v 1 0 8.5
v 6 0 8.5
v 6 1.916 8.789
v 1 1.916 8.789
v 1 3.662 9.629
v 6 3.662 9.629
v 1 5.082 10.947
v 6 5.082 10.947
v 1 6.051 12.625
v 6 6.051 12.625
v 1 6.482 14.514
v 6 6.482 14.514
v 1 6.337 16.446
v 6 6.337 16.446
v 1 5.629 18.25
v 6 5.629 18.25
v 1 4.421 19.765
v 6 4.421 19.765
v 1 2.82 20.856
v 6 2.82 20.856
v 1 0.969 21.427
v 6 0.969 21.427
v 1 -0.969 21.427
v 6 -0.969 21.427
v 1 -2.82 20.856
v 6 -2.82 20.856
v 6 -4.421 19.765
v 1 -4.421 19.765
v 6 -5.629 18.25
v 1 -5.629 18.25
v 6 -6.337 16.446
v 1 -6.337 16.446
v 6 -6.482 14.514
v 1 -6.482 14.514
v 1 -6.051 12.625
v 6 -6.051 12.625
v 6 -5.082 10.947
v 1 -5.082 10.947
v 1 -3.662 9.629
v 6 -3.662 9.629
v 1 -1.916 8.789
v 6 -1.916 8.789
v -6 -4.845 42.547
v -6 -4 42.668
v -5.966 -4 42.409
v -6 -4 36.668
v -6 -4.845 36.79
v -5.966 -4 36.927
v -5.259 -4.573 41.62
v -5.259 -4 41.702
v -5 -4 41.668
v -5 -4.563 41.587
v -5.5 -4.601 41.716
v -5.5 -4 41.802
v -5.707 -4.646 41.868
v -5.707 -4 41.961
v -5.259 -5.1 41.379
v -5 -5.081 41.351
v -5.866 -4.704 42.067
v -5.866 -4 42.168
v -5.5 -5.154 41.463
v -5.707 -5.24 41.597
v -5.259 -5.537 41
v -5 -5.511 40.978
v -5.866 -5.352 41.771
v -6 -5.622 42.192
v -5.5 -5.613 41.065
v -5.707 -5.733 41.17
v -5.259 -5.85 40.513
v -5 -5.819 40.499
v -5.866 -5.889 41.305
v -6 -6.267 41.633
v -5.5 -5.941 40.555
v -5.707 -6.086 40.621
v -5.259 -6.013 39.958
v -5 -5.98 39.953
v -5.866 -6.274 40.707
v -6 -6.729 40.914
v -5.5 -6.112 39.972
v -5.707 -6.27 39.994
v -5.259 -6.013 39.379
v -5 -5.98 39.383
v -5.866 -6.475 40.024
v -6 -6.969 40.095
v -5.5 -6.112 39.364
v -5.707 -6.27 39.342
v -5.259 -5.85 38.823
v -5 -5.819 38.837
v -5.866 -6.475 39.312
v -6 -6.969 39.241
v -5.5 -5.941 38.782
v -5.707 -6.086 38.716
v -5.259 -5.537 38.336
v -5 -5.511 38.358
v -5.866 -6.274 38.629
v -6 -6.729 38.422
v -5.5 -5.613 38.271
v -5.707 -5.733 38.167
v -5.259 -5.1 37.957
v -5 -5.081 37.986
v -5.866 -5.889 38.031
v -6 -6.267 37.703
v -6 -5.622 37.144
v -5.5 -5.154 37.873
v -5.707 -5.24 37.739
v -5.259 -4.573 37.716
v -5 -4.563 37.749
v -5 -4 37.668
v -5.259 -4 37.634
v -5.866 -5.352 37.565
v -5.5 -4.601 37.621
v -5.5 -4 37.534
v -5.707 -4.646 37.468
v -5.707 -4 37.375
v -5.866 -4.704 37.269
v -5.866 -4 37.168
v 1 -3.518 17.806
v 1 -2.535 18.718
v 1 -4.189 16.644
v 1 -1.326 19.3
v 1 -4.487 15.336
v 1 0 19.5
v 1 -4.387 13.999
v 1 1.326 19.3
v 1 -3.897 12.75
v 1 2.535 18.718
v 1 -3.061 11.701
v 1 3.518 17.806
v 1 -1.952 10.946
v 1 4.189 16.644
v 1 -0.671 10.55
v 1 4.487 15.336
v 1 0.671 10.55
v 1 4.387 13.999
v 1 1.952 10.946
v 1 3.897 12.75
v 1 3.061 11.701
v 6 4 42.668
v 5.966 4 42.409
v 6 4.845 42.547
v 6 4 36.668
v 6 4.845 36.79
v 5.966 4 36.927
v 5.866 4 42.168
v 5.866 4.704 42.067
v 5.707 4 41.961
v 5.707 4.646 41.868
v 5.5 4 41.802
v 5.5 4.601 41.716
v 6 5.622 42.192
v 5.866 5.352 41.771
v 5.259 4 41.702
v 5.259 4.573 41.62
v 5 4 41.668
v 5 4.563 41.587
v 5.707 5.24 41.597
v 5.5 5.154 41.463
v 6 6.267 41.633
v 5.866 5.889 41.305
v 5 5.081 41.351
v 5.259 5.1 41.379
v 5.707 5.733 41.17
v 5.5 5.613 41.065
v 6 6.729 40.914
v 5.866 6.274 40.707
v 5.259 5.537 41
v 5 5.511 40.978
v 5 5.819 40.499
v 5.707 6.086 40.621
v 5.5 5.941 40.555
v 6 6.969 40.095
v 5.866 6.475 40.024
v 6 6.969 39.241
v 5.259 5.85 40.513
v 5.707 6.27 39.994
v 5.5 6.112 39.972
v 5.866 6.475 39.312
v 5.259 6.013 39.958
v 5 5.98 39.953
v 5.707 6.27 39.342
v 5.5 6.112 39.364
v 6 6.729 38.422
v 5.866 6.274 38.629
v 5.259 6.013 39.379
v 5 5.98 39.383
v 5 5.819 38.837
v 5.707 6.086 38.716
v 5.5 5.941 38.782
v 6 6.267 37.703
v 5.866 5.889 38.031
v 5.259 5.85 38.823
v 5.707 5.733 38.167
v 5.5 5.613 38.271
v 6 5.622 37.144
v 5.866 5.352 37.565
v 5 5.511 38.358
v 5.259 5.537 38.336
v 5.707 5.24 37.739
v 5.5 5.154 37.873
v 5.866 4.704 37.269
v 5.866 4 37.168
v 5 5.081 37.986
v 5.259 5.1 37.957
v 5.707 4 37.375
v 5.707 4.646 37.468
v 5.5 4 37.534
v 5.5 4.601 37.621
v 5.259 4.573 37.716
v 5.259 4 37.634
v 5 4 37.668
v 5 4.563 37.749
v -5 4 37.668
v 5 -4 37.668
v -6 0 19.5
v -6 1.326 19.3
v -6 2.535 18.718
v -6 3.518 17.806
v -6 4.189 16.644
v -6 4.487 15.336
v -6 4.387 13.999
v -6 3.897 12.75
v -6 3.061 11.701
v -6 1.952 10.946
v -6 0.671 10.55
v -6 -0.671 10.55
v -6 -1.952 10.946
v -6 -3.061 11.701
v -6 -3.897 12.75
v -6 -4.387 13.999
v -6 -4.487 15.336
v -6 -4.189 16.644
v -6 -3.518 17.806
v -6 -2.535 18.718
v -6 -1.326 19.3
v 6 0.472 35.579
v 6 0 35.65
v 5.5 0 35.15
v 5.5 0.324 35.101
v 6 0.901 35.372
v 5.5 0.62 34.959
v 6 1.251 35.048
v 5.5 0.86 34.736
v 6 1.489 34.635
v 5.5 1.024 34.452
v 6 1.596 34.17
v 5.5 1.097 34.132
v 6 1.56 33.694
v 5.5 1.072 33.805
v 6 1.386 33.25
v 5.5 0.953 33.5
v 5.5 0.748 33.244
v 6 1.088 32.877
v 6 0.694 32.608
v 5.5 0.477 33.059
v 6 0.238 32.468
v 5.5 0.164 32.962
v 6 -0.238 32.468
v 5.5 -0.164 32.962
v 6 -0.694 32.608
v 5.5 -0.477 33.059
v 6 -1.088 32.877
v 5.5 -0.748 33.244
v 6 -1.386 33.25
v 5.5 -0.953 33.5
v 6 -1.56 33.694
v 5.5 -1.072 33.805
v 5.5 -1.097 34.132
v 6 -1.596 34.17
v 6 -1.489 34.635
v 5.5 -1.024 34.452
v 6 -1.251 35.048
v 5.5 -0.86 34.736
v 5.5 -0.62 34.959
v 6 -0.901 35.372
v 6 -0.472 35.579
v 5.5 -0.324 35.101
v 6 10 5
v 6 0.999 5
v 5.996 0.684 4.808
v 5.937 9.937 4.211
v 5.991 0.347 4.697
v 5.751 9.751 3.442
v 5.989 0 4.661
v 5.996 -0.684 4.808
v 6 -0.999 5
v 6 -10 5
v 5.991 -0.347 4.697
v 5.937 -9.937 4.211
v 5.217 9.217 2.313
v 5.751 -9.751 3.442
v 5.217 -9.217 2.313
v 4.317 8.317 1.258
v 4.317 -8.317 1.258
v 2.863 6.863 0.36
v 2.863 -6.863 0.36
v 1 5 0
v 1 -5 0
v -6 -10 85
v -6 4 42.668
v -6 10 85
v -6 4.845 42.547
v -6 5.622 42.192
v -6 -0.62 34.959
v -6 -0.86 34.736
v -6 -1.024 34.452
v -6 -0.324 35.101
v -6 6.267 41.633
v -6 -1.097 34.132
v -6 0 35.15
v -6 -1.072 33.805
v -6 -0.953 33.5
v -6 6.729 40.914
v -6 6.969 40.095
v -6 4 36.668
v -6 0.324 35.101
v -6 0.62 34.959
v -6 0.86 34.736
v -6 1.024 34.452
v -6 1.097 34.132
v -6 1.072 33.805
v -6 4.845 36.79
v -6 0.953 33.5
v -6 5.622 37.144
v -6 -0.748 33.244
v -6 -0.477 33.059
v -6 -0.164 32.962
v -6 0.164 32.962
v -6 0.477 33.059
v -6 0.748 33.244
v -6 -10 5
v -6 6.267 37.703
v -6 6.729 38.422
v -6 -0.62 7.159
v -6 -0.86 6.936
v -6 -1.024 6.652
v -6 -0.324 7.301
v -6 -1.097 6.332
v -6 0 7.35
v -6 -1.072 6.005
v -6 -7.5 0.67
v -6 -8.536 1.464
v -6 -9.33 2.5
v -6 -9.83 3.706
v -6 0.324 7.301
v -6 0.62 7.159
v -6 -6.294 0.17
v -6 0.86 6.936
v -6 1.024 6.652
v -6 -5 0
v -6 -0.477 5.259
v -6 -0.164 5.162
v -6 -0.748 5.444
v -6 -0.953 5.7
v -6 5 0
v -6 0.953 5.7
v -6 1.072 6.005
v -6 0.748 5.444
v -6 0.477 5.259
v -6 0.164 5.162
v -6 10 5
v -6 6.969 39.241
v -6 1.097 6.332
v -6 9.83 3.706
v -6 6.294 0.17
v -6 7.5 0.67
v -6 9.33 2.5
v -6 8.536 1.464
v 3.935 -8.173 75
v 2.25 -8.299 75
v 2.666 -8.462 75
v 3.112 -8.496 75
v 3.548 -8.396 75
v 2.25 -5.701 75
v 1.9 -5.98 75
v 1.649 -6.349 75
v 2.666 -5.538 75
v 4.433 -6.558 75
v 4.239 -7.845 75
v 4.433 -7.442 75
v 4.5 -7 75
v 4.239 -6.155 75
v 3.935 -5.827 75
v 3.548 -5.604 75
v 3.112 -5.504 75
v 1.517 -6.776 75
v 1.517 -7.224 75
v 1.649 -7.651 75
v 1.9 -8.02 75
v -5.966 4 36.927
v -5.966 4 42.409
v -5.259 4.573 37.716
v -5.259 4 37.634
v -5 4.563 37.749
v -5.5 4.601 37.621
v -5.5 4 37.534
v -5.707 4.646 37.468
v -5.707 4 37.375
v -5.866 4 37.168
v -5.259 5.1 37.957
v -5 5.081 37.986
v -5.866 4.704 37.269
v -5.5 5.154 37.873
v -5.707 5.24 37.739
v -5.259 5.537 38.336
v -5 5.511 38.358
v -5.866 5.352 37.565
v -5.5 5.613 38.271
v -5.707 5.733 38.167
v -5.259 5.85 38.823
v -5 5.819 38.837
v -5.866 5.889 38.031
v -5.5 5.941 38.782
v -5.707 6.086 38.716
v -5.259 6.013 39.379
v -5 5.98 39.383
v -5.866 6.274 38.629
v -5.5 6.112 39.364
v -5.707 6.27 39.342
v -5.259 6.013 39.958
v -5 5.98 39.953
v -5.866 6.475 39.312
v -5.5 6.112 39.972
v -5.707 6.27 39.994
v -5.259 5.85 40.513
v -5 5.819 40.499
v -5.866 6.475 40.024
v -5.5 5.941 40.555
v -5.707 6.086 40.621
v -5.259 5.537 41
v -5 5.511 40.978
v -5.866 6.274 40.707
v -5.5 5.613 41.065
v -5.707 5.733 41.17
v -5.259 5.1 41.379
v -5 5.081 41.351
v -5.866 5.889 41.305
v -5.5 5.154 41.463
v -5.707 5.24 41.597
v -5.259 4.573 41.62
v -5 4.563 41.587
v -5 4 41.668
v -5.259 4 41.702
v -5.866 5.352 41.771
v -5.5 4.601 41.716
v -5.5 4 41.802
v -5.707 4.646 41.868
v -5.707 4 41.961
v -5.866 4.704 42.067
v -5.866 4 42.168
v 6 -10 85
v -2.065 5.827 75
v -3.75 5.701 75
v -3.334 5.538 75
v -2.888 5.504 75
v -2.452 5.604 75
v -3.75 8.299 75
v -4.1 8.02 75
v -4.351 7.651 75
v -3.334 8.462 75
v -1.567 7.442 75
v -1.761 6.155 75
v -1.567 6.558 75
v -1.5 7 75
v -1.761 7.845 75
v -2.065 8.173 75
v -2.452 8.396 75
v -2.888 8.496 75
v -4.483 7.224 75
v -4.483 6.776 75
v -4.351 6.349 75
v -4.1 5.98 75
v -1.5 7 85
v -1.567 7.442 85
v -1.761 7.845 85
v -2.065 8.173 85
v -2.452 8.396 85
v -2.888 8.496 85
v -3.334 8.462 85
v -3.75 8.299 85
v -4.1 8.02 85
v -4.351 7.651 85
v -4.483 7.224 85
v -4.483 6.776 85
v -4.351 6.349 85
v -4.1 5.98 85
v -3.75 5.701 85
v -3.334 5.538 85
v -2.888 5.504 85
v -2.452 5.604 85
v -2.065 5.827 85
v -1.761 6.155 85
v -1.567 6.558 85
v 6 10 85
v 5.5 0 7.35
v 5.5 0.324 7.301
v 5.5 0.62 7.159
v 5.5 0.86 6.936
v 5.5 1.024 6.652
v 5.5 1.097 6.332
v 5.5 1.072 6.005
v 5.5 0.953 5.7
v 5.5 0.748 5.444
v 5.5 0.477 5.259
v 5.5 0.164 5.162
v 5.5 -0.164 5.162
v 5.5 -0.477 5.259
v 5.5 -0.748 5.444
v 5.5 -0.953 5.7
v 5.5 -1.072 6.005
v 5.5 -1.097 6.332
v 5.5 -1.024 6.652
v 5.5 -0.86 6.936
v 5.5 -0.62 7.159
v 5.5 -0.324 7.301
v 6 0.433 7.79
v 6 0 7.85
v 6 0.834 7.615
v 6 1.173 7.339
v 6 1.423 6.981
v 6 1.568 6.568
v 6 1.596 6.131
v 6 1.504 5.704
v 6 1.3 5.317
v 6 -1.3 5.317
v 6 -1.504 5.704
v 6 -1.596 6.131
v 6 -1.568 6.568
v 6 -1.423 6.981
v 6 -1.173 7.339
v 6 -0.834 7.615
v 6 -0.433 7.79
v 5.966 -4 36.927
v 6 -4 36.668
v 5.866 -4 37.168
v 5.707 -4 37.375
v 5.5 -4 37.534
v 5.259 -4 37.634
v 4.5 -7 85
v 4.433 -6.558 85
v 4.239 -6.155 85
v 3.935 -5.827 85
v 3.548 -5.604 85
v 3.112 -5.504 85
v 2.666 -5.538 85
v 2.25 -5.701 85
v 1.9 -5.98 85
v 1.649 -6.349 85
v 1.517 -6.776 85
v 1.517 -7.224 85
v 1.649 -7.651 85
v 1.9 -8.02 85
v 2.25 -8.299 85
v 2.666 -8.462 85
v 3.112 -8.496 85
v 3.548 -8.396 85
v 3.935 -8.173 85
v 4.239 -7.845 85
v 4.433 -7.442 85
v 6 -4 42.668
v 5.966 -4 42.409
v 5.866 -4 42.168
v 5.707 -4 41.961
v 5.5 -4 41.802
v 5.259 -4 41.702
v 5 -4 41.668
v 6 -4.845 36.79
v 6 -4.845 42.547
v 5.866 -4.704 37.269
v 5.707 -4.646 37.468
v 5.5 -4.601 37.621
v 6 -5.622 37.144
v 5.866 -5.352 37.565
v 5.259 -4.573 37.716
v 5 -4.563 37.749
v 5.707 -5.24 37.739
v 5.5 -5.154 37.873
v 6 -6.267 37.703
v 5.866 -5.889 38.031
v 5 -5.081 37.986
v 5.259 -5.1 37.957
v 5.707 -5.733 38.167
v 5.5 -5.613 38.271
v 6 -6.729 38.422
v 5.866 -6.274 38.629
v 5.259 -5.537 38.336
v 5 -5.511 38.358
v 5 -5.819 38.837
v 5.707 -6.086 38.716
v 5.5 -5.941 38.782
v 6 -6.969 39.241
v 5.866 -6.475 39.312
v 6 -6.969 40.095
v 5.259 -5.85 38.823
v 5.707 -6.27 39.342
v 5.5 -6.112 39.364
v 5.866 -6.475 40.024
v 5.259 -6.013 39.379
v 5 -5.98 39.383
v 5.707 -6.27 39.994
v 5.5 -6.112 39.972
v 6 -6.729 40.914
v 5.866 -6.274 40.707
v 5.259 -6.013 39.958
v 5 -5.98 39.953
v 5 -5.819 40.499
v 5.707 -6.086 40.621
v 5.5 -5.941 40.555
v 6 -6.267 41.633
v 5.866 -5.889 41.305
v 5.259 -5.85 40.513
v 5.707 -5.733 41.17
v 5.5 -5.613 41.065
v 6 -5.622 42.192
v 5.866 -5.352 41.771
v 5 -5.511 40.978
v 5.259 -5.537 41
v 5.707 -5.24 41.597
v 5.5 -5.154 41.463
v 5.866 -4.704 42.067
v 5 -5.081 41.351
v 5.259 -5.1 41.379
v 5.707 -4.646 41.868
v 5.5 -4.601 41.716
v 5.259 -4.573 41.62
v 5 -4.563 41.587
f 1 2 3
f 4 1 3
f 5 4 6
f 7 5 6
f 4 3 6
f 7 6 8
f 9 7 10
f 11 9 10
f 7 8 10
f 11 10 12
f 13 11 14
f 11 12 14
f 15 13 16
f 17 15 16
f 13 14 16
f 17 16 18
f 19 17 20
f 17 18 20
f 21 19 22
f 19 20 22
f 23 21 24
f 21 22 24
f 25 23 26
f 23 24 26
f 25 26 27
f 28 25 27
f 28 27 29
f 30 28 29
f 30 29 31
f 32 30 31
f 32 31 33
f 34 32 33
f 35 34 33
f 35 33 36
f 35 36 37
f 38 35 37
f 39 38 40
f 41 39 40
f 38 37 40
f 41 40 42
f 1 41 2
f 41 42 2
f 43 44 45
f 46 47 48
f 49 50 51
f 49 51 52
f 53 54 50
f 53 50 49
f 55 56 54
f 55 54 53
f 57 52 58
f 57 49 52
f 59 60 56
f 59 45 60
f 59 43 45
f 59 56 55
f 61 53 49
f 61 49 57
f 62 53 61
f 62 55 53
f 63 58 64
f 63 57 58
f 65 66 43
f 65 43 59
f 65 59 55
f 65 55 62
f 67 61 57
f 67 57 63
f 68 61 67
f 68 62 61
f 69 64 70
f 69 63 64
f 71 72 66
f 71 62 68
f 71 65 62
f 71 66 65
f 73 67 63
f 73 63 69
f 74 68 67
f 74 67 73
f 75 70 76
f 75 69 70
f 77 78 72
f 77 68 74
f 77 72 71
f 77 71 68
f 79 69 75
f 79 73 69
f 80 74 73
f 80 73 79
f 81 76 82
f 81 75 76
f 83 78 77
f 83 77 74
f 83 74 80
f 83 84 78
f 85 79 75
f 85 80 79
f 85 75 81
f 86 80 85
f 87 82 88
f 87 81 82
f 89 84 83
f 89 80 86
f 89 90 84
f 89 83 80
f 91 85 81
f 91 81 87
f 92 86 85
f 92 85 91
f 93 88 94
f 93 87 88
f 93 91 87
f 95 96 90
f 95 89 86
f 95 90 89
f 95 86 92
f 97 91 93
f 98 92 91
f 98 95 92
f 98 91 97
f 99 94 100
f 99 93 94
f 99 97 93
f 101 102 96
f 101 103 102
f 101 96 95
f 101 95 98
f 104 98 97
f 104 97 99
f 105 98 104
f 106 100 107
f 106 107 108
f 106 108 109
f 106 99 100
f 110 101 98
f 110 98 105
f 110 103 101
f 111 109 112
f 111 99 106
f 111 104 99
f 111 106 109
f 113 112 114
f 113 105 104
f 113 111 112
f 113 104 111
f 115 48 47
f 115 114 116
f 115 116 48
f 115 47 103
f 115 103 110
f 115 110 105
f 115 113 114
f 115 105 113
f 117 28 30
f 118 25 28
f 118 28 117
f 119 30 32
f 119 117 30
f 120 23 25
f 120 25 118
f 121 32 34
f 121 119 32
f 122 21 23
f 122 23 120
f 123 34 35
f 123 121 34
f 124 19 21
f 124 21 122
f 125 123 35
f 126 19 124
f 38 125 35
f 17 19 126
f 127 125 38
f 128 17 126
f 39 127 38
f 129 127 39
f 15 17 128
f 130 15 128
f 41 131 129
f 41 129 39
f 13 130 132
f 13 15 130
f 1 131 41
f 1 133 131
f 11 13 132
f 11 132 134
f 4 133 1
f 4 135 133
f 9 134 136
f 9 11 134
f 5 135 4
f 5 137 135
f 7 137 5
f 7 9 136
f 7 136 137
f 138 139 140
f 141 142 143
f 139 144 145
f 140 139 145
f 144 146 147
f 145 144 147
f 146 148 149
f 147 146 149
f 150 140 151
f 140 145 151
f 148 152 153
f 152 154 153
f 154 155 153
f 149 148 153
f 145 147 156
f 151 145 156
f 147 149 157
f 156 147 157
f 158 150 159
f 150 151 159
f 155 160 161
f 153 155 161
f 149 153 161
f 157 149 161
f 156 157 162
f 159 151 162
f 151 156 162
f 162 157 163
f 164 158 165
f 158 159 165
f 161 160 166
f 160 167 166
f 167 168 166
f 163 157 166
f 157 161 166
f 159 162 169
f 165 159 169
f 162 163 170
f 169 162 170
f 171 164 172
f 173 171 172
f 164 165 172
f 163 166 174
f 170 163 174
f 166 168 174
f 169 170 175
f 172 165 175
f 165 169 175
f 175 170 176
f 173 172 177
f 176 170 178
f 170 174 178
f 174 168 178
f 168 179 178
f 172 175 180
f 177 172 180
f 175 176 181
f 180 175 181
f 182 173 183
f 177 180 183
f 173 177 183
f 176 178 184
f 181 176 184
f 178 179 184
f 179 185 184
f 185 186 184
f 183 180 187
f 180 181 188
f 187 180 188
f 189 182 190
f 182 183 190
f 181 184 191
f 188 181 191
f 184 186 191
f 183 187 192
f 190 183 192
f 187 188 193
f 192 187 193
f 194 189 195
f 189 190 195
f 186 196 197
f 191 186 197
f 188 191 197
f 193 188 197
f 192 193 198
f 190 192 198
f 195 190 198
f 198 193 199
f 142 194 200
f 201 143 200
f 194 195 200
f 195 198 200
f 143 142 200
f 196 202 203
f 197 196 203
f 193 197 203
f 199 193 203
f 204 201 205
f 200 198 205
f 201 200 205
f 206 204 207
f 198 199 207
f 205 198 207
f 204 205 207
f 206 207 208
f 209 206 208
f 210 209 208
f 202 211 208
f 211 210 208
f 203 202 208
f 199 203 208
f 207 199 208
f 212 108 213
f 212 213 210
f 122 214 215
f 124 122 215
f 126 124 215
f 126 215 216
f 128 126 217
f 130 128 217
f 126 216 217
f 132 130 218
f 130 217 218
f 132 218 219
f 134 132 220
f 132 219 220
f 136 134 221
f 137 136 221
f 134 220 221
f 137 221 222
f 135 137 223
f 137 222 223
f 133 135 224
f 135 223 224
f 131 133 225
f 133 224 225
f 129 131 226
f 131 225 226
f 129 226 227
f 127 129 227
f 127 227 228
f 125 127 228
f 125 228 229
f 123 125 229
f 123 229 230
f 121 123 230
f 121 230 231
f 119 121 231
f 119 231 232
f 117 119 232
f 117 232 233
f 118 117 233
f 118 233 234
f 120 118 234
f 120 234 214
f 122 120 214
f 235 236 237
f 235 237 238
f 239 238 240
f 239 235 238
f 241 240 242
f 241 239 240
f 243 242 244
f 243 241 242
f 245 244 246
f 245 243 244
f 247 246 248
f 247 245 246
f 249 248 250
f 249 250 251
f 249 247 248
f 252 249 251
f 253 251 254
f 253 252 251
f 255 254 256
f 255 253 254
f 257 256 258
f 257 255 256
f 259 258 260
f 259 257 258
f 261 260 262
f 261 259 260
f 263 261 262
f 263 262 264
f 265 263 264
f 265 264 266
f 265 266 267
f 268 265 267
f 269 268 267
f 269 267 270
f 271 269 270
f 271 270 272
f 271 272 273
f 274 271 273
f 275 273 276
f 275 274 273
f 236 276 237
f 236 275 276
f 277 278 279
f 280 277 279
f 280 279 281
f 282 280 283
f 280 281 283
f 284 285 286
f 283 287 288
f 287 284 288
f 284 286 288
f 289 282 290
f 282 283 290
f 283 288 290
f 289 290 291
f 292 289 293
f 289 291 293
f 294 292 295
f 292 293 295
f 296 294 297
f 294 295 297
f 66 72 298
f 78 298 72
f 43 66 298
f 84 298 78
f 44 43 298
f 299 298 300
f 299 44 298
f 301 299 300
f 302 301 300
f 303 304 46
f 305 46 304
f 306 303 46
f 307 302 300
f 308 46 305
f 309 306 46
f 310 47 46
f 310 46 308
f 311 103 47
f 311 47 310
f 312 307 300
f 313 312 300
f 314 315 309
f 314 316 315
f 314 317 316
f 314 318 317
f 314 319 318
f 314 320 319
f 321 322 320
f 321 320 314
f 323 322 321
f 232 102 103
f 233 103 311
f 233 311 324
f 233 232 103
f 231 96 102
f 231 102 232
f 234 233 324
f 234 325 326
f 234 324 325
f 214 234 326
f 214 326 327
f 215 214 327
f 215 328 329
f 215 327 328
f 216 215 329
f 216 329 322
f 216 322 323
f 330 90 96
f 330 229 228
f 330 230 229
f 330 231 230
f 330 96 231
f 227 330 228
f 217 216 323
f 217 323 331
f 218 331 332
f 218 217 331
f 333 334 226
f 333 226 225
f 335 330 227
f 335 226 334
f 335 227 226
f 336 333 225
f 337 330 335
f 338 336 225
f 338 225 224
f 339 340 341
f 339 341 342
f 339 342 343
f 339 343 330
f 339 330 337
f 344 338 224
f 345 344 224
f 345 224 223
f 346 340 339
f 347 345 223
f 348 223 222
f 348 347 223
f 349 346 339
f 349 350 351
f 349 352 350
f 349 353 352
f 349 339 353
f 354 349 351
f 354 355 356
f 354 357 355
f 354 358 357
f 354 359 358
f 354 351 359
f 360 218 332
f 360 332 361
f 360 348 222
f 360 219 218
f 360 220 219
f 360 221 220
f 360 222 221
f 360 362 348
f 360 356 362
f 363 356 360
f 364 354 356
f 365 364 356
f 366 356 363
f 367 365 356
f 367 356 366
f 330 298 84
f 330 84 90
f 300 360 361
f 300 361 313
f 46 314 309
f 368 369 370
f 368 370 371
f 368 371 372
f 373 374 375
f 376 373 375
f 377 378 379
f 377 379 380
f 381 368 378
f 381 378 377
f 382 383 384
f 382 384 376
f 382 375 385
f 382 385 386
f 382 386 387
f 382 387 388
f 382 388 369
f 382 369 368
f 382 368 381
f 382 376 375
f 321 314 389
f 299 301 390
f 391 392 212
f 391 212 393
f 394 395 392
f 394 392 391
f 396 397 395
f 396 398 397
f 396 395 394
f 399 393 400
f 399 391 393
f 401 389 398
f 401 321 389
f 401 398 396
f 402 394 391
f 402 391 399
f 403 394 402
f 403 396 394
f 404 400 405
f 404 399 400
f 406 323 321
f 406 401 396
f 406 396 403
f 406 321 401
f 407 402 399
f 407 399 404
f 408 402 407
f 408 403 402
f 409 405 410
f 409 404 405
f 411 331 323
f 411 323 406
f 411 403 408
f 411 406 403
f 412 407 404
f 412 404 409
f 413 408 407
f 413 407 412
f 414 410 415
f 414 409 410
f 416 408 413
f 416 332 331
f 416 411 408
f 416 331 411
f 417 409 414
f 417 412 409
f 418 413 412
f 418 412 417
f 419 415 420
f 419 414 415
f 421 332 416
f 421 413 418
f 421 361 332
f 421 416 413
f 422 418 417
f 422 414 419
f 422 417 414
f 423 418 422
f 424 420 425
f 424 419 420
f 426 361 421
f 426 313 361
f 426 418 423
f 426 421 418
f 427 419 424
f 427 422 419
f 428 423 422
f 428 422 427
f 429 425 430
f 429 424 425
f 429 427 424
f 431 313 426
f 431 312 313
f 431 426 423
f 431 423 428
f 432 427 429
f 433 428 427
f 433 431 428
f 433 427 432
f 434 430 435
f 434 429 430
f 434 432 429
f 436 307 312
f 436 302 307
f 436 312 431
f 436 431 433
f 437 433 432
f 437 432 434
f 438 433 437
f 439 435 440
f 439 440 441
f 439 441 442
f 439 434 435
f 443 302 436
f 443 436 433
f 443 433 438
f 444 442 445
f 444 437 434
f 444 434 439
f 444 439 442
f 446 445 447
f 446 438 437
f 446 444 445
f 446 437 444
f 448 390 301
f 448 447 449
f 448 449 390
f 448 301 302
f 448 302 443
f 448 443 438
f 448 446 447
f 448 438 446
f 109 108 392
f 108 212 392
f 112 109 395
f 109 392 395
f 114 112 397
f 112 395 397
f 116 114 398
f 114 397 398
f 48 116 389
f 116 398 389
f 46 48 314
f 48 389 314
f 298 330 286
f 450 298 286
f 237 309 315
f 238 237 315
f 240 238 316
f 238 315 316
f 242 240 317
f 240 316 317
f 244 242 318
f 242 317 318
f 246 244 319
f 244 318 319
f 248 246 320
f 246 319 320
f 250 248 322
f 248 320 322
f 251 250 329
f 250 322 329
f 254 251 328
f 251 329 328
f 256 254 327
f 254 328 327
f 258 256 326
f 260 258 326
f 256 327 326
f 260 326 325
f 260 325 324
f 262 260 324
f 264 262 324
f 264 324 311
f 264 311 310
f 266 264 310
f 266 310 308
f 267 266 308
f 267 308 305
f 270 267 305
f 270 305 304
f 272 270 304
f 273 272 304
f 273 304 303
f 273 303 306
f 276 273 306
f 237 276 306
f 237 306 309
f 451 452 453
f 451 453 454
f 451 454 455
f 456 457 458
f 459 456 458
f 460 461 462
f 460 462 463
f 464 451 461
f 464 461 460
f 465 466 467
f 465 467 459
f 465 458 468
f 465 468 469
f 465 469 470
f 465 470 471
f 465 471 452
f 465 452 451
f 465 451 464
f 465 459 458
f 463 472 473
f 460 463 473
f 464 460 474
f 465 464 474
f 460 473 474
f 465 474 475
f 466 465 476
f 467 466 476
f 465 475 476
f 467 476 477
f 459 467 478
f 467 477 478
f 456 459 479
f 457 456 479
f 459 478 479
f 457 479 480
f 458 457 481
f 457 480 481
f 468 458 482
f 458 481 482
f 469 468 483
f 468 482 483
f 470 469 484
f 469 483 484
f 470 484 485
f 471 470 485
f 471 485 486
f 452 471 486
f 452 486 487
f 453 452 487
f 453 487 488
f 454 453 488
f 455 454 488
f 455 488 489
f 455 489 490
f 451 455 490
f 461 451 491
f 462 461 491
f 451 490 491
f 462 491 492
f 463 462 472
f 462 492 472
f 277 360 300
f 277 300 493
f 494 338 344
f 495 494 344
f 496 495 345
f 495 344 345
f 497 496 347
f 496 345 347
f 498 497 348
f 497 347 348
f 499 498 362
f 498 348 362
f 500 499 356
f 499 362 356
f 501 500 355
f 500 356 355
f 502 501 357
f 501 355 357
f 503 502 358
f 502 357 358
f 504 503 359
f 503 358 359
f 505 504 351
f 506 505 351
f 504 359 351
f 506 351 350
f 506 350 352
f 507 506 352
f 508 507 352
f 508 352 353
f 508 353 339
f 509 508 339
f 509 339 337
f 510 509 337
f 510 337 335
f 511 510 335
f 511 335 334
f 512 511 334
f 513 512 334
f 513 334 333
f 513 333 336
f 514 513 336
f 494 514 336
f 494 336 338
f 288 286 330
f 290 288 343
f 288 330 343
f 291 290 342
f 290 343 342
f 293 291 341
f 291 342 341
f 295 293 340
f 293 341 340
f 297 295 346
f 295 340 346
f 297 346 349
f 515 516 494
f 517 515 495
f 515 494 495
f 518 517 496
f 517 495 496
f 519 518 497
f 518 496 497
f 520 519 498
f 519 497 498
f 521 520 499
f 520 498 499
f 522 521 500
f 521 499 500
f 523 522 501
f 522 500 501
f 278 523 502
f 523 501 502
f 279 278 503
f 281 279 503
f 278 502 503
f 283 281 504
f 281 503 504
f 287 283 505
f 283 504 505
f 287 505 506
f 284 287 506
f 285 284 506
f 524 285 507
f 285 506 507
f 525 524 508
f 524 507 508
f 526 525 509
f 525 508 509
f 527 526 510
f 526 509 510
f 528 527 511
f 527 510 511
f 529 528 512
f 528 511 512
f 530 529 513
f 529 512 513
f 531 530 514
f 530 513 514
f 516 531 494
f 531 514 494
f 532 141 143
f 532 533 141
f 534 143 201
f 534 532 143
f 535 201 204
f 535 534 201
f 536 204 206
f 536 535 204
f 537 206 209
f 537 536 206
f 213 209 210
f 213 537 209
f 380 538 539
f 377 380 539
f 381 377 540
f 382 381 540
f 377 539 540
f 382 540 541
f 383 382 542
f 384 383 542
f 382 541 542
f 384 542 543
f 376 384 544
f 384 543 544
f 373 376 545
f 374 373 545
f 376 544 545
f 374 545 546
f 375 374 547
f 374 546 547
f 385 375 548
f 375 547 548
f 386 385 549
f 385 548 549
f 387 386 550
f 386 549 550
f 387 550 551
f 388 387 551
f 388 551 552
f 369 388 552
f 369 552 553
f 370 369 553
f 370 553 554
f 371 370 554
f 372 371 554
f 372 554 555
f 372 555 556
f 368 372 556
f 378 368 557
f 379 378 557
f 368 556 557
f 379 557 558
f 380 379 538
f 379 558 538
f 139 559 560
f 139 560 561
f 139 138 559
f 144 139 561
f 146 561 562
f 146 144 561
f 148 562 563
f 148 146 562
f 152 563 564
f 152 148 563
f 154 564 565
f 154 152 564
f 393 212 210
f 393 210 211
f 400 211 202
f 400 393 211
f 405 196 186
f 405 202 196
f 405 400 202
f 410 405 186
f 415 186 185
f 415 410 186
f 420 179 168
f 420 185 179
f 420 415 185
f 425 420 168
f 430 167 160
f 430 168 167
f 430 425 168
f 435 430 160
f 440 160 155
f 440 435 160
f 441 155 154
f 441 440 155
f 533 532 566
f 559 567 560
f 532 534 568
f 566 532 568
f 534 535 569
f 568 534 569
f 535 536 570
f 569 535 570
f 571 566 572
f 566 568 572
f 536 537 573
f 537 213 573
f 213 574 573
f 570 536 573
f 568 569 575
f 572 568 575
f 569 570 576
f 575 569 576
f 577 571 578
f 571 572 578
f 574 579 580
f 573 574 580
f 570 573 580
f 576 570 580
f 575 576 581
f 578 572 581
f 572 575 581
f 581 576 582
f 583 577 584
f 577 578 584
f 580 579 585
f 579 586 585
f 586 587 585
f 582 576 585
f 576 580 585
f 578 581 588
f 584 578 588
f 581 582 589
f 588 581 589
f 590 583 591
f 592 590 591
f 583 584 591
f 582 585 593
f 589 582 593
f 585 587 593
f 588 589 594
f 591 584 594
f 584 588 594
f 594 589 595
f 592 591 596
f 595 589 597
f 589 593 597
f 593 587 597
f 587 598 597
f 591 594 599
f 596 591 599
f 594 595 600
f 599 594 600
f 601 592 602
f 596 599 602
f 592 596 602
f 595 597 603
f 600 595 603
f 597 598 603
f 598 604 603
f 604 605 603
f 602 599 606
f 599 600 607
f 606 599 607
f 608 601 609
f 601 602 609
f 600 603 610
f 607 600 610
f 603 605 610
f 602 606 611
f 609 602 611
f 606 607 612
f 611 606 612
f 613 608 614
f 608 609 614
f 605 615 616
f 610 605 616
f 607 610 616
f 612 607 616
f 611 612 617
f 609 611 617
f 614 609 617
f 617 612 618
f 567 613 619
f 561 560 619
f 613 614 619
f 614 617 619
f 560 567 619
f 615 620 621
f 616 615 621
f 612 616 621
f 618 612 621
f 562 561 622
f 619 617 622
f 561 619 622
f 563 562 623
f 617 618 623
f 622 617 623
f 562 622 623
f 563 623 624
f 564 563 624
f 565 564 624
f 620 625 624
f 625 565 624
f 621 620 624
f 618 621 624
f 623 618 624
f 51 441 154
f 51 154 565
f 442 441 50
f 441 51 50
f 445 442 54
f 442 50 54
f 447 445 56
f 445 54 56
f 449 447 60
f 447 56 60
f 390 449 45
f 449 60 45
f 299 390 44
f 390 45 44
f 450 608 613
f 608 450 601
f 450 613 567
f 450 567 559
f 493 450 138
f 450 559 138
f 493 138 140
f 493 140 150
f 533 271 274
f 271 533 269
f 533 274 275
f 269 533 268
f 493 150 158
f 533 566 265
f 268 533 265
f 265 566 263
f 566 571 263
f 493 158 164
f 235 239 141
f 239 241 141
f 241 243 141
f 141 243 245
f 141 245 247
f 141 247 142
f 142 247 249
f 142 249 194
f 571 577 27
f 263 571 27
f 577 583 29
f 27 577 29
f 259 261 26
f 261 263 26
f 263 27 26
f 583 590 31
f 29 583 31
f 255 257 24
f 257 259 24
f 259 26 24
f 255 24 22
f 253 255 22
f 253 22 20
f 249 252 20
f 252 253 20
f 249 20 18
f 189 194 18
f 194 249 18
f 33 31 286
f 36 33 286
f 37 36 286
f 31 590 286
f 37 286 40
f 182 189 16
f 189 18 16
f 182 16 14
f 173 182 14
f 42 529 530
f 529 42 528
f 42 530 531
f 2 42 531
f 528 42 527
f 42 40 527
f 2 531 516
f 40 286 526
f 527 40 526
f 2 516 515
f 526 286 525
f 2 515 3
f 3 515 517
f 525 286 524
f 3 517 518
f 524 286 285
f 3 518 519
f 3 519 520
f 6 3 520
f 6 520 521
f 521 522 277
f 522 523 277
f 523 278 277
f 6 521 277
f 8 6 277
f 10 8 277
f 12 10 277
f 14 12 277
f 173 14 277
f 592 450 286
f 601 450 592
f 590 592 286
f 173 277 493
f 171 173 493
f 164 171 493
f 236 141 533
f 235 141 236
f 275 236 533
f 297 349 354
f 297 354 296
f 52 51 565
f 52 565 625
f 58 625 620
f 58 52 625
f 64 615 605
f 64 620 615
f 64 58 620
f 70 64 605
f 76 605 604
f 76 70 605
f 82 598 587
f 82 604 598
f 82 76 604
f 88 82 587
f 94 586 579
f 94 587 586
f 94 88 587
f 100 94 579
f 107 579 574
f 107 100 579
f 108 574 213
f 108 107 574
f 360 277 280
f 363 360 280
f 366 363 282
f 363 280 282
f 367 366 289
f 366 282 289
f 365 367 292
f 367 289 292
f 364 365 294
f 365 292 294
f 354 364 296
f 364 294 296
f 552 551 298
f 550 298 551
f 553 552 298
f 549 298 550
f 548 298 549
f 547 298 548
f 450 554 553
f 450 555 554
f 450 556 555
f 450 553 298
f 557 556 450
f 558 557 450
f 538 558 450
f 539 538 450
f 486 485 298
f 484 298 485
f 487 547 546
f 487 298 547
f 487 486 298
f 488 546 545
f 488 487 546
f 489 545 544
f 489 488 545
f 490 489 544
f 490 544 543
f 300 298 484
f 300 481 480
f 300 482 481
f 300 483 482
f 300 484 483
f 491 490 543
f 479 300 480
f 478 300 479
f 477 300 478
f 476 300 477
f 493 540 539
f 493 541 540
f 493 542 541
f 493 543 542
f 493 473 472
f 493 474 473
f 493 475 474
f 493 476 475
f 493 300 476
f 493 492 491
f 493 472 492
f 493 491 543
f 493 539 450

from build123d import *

# Parameters (mm, degrees)
SZKIC1_W                    = 12
SZKIC1_H                    = 20
DODANIE_WYCI_GNI_CIE1_DEPTH = 85
SZKIC2_R                    = 1.5
WYTNIJ_WYCI_GNI_CIE1_DEPTH  = 10
SZKIC4_R                    = 6.5
WYTNIJ_WYCI_GNI_CIE2_DEPTH  = 5
SZKIC5_R                    = 4.5
WYTNIJ_WYCI_GNI_CIE3_DEPTH  = 87.423376467
SZKIC6_R                    = 1.1
WYTNIJ_WYCI_GNI_CIE4_DEPTH  = 87.423376467
SFAZOWANIE1_SIZE            = 0.5
SZKIC7_R                    = 1.1
WYTNIJ_WYCI_GNI_CIE5_DEPTH  = 87.423376467
SFAZOWANIE2_SIZE            = 0.5
ZAOKR_GLENIE1_R             = 5
WYTNIJ_WYCI_GNI_CIE6_DEPTH  = 87.423376493
ZAOKR_GLENIE2_R             = 1


with BuildPart() as part:
    # Szkic1 → Dodanie-wyciągnięcie1 (new body)
    with BuildSketch(Plane.XY):
        Rectangle(SZKIC1_W, SZKIC1_H)
    extrude(amount=DODANIE_WYCI_GNI_CIE1_DEPTH)

    # Szkic2 → Wytnij-wyciągnięcie1 (cut)
    with BuildSketch(Plane.XY.offset(85)):
        with Locations((-3, 7)):
            Circle(SZKIC2_R)
        with Locations((3, -7)):
            Circle(SZKIC2_R)
    extrude(amount=-WYTNIJ_WYCI_GNI_CIE1_DEPTH, mode=Mode.SUBTRACT)

    # Szkic4 → Wytnij-wyciągnięcie2 (cut)
    with BuildSketch(Plane(origin=(6, 0, 0), x_dir=(0, 0, -1), z_dir=(1, 0, 0))):
        with Locations((-15, 0)):
            Circle(SZKIC4_R)
    extrude(amount=-WYTNIJ_WYCI_GNI_CIE2_DEPTH, mode=Mode.SUBTRACT)

    # Szkic5 → Wytnij-wyciągnięcie3 (cut, through all)
    with BuildSketch(Plane.ZY.offset(6)):
        with Locations((15, 0)):
            Circle(SZKIC5_R)
    extrude(amount=-WYTNIJ_WYCI_GNI_CIE3_DEPTH, mode=Mode.SUBTRACT)

    # Szkic6 → Wytnij-wyciągnięcie4 (cut, through all)
    with BuildSketch(Plane.ZY.offset(6)):
        with Locations((34.05, 0)):
            Circle(SZKIC6_R)
    extrude(amount=-WYTNIJ_WYCI_GNI_CIE4_DEPTH, mode=Mode.SUBTRACT)

    # Sfazowanie1
    sfazowanie1_edges = [part.edges().sort_by_distance(p)[0] for p in [
        (6, 0, 32.95),
    ]]
    chamfer(sfazowanie1_edges, length=SFAZOWANIE1_SIZE)

    # Szkic7 → Wytnij-wyciągnięcie5 (cut, through all)
    with BuildSketch(Plane.ZY.offset(6)):
        with Locations((6.25, 0)):
            Circle(SZKIC7_R)
    extrude(amount=-WYTNIJ_WYCI_GNI_CIE5_DEPTH, mode=Mode.SUBTRACT)

    # Sfazowanie2
    sfazowanie2_edges = [part.edges().sort_by_distance(p)[0] for p in [
        (6, 0, 5.15),
    ]]
    chamfer(sfazowanie2_edges, length=SFAZOWANIE2_SIZE)

    # Zaokrąglenie1
    # the kernel refuses this fillet: 5 mm, written as the material it takes off along each edge
    with BuildSketch(Plane(origin=(-18.5, -10, 0), x_dir=(0, 0, 1), z_dir=(1, 0, 0))) as zaokr_glenie1_piece_1:
        with BuildLine():
            CenterArc((ZAOKR_GLENIE1_R, -ZAOKR_GLENIE1_R), ZAOKR_GLENIE1_R, 90, 90)
            Line((0, -ZAOKR_GLENIE1_R), (0, 0))
            Line((0, 0), (ZAOKR_GLENIE1_R, 0))
        make_face()
    extrude(amount=37, mode=Mode.SUBTRACT)
    with BuildSketch(Plane(origin=(18.5, 10, 0), x_dir=(0, -1, 0), z_dir=(-1, 0, 0))) as zaokr_glenie1_piece_2:
        with BuildLine():
            CenterArc((ZAOKR_GLENIE1_R, ZAOKR_GLENIE1_R), ZAOKR_GLENIE1_R, 180, 90)
            Line((0, ZAOKR_GLENIE1_R), (0, 0))
            Line((0, 0), (ZAOKR_GLENIE1_R, 0))
        make_face()
    extrude(amount=37, mode=Mode.SUBTRACT)
    with BuildSketch(Plane(origin=(6, -22.5, 0), x_dir=(0, 0, 1), z_dir=(0, 1, 0))) as zaokr_glenie1_piece_3:
        with BuildLine():
            CenterArc((ZAOKR_GLENIE1_R, -ZAOKR_GLENIE1_R), ZAOKR_GLENIE1_R, 90, 90)
            Line((0, -ZAOKR_GLENIE1_R), (0, 0))
            Line((0, 0), (ZAOKR_GLENIE1_R, 0))
        make_face()
    extrude(amount=45, mode=Mode.SUBTRACT)

    # Szkic8 → Wytnij-wyciągnięcie6 (cut, through all)
    with BuildSketch(Plane.ZY.offset(6)):
        with BuildLine():
            Line((37.668037351, -4), (37.668037351, 4))
            ThreePointArc((37.668037351, 4), (39.668037351, 6), (41.668037351, 4))
            Line((41.668037351, 4), (41.668037351, -4))
            ThreePointArc((41.668037351, -4), (39.668037351, -6), (37.668037351, -4))
        make_face()
    extrude(amount=-WYTNIJ_WYCI_GNI_CIE6_DEPTH, mode=Mode.SUBTRACT)

    # Zaokrąglenie2
    zaokr_glenie2_edges = [part.edges().sort_by_distance(p)[0] for p in [
        (6, -6, 39.668037351),
        (6, 0, 37.668037351),
        (6, 6, 39.668037351),
        (6, 0, 41.668037351),
        (-6, -6, 39.668037351),
        (-6, 0, 41.668037351),
        (-6, 6, 39.668037351),
        (-6, 0, 37.668037351),
    ]]
    fillet(zaokr_glenie2_edges, radius=ZAOKR_GLENIE2_R)


solid = part.part
